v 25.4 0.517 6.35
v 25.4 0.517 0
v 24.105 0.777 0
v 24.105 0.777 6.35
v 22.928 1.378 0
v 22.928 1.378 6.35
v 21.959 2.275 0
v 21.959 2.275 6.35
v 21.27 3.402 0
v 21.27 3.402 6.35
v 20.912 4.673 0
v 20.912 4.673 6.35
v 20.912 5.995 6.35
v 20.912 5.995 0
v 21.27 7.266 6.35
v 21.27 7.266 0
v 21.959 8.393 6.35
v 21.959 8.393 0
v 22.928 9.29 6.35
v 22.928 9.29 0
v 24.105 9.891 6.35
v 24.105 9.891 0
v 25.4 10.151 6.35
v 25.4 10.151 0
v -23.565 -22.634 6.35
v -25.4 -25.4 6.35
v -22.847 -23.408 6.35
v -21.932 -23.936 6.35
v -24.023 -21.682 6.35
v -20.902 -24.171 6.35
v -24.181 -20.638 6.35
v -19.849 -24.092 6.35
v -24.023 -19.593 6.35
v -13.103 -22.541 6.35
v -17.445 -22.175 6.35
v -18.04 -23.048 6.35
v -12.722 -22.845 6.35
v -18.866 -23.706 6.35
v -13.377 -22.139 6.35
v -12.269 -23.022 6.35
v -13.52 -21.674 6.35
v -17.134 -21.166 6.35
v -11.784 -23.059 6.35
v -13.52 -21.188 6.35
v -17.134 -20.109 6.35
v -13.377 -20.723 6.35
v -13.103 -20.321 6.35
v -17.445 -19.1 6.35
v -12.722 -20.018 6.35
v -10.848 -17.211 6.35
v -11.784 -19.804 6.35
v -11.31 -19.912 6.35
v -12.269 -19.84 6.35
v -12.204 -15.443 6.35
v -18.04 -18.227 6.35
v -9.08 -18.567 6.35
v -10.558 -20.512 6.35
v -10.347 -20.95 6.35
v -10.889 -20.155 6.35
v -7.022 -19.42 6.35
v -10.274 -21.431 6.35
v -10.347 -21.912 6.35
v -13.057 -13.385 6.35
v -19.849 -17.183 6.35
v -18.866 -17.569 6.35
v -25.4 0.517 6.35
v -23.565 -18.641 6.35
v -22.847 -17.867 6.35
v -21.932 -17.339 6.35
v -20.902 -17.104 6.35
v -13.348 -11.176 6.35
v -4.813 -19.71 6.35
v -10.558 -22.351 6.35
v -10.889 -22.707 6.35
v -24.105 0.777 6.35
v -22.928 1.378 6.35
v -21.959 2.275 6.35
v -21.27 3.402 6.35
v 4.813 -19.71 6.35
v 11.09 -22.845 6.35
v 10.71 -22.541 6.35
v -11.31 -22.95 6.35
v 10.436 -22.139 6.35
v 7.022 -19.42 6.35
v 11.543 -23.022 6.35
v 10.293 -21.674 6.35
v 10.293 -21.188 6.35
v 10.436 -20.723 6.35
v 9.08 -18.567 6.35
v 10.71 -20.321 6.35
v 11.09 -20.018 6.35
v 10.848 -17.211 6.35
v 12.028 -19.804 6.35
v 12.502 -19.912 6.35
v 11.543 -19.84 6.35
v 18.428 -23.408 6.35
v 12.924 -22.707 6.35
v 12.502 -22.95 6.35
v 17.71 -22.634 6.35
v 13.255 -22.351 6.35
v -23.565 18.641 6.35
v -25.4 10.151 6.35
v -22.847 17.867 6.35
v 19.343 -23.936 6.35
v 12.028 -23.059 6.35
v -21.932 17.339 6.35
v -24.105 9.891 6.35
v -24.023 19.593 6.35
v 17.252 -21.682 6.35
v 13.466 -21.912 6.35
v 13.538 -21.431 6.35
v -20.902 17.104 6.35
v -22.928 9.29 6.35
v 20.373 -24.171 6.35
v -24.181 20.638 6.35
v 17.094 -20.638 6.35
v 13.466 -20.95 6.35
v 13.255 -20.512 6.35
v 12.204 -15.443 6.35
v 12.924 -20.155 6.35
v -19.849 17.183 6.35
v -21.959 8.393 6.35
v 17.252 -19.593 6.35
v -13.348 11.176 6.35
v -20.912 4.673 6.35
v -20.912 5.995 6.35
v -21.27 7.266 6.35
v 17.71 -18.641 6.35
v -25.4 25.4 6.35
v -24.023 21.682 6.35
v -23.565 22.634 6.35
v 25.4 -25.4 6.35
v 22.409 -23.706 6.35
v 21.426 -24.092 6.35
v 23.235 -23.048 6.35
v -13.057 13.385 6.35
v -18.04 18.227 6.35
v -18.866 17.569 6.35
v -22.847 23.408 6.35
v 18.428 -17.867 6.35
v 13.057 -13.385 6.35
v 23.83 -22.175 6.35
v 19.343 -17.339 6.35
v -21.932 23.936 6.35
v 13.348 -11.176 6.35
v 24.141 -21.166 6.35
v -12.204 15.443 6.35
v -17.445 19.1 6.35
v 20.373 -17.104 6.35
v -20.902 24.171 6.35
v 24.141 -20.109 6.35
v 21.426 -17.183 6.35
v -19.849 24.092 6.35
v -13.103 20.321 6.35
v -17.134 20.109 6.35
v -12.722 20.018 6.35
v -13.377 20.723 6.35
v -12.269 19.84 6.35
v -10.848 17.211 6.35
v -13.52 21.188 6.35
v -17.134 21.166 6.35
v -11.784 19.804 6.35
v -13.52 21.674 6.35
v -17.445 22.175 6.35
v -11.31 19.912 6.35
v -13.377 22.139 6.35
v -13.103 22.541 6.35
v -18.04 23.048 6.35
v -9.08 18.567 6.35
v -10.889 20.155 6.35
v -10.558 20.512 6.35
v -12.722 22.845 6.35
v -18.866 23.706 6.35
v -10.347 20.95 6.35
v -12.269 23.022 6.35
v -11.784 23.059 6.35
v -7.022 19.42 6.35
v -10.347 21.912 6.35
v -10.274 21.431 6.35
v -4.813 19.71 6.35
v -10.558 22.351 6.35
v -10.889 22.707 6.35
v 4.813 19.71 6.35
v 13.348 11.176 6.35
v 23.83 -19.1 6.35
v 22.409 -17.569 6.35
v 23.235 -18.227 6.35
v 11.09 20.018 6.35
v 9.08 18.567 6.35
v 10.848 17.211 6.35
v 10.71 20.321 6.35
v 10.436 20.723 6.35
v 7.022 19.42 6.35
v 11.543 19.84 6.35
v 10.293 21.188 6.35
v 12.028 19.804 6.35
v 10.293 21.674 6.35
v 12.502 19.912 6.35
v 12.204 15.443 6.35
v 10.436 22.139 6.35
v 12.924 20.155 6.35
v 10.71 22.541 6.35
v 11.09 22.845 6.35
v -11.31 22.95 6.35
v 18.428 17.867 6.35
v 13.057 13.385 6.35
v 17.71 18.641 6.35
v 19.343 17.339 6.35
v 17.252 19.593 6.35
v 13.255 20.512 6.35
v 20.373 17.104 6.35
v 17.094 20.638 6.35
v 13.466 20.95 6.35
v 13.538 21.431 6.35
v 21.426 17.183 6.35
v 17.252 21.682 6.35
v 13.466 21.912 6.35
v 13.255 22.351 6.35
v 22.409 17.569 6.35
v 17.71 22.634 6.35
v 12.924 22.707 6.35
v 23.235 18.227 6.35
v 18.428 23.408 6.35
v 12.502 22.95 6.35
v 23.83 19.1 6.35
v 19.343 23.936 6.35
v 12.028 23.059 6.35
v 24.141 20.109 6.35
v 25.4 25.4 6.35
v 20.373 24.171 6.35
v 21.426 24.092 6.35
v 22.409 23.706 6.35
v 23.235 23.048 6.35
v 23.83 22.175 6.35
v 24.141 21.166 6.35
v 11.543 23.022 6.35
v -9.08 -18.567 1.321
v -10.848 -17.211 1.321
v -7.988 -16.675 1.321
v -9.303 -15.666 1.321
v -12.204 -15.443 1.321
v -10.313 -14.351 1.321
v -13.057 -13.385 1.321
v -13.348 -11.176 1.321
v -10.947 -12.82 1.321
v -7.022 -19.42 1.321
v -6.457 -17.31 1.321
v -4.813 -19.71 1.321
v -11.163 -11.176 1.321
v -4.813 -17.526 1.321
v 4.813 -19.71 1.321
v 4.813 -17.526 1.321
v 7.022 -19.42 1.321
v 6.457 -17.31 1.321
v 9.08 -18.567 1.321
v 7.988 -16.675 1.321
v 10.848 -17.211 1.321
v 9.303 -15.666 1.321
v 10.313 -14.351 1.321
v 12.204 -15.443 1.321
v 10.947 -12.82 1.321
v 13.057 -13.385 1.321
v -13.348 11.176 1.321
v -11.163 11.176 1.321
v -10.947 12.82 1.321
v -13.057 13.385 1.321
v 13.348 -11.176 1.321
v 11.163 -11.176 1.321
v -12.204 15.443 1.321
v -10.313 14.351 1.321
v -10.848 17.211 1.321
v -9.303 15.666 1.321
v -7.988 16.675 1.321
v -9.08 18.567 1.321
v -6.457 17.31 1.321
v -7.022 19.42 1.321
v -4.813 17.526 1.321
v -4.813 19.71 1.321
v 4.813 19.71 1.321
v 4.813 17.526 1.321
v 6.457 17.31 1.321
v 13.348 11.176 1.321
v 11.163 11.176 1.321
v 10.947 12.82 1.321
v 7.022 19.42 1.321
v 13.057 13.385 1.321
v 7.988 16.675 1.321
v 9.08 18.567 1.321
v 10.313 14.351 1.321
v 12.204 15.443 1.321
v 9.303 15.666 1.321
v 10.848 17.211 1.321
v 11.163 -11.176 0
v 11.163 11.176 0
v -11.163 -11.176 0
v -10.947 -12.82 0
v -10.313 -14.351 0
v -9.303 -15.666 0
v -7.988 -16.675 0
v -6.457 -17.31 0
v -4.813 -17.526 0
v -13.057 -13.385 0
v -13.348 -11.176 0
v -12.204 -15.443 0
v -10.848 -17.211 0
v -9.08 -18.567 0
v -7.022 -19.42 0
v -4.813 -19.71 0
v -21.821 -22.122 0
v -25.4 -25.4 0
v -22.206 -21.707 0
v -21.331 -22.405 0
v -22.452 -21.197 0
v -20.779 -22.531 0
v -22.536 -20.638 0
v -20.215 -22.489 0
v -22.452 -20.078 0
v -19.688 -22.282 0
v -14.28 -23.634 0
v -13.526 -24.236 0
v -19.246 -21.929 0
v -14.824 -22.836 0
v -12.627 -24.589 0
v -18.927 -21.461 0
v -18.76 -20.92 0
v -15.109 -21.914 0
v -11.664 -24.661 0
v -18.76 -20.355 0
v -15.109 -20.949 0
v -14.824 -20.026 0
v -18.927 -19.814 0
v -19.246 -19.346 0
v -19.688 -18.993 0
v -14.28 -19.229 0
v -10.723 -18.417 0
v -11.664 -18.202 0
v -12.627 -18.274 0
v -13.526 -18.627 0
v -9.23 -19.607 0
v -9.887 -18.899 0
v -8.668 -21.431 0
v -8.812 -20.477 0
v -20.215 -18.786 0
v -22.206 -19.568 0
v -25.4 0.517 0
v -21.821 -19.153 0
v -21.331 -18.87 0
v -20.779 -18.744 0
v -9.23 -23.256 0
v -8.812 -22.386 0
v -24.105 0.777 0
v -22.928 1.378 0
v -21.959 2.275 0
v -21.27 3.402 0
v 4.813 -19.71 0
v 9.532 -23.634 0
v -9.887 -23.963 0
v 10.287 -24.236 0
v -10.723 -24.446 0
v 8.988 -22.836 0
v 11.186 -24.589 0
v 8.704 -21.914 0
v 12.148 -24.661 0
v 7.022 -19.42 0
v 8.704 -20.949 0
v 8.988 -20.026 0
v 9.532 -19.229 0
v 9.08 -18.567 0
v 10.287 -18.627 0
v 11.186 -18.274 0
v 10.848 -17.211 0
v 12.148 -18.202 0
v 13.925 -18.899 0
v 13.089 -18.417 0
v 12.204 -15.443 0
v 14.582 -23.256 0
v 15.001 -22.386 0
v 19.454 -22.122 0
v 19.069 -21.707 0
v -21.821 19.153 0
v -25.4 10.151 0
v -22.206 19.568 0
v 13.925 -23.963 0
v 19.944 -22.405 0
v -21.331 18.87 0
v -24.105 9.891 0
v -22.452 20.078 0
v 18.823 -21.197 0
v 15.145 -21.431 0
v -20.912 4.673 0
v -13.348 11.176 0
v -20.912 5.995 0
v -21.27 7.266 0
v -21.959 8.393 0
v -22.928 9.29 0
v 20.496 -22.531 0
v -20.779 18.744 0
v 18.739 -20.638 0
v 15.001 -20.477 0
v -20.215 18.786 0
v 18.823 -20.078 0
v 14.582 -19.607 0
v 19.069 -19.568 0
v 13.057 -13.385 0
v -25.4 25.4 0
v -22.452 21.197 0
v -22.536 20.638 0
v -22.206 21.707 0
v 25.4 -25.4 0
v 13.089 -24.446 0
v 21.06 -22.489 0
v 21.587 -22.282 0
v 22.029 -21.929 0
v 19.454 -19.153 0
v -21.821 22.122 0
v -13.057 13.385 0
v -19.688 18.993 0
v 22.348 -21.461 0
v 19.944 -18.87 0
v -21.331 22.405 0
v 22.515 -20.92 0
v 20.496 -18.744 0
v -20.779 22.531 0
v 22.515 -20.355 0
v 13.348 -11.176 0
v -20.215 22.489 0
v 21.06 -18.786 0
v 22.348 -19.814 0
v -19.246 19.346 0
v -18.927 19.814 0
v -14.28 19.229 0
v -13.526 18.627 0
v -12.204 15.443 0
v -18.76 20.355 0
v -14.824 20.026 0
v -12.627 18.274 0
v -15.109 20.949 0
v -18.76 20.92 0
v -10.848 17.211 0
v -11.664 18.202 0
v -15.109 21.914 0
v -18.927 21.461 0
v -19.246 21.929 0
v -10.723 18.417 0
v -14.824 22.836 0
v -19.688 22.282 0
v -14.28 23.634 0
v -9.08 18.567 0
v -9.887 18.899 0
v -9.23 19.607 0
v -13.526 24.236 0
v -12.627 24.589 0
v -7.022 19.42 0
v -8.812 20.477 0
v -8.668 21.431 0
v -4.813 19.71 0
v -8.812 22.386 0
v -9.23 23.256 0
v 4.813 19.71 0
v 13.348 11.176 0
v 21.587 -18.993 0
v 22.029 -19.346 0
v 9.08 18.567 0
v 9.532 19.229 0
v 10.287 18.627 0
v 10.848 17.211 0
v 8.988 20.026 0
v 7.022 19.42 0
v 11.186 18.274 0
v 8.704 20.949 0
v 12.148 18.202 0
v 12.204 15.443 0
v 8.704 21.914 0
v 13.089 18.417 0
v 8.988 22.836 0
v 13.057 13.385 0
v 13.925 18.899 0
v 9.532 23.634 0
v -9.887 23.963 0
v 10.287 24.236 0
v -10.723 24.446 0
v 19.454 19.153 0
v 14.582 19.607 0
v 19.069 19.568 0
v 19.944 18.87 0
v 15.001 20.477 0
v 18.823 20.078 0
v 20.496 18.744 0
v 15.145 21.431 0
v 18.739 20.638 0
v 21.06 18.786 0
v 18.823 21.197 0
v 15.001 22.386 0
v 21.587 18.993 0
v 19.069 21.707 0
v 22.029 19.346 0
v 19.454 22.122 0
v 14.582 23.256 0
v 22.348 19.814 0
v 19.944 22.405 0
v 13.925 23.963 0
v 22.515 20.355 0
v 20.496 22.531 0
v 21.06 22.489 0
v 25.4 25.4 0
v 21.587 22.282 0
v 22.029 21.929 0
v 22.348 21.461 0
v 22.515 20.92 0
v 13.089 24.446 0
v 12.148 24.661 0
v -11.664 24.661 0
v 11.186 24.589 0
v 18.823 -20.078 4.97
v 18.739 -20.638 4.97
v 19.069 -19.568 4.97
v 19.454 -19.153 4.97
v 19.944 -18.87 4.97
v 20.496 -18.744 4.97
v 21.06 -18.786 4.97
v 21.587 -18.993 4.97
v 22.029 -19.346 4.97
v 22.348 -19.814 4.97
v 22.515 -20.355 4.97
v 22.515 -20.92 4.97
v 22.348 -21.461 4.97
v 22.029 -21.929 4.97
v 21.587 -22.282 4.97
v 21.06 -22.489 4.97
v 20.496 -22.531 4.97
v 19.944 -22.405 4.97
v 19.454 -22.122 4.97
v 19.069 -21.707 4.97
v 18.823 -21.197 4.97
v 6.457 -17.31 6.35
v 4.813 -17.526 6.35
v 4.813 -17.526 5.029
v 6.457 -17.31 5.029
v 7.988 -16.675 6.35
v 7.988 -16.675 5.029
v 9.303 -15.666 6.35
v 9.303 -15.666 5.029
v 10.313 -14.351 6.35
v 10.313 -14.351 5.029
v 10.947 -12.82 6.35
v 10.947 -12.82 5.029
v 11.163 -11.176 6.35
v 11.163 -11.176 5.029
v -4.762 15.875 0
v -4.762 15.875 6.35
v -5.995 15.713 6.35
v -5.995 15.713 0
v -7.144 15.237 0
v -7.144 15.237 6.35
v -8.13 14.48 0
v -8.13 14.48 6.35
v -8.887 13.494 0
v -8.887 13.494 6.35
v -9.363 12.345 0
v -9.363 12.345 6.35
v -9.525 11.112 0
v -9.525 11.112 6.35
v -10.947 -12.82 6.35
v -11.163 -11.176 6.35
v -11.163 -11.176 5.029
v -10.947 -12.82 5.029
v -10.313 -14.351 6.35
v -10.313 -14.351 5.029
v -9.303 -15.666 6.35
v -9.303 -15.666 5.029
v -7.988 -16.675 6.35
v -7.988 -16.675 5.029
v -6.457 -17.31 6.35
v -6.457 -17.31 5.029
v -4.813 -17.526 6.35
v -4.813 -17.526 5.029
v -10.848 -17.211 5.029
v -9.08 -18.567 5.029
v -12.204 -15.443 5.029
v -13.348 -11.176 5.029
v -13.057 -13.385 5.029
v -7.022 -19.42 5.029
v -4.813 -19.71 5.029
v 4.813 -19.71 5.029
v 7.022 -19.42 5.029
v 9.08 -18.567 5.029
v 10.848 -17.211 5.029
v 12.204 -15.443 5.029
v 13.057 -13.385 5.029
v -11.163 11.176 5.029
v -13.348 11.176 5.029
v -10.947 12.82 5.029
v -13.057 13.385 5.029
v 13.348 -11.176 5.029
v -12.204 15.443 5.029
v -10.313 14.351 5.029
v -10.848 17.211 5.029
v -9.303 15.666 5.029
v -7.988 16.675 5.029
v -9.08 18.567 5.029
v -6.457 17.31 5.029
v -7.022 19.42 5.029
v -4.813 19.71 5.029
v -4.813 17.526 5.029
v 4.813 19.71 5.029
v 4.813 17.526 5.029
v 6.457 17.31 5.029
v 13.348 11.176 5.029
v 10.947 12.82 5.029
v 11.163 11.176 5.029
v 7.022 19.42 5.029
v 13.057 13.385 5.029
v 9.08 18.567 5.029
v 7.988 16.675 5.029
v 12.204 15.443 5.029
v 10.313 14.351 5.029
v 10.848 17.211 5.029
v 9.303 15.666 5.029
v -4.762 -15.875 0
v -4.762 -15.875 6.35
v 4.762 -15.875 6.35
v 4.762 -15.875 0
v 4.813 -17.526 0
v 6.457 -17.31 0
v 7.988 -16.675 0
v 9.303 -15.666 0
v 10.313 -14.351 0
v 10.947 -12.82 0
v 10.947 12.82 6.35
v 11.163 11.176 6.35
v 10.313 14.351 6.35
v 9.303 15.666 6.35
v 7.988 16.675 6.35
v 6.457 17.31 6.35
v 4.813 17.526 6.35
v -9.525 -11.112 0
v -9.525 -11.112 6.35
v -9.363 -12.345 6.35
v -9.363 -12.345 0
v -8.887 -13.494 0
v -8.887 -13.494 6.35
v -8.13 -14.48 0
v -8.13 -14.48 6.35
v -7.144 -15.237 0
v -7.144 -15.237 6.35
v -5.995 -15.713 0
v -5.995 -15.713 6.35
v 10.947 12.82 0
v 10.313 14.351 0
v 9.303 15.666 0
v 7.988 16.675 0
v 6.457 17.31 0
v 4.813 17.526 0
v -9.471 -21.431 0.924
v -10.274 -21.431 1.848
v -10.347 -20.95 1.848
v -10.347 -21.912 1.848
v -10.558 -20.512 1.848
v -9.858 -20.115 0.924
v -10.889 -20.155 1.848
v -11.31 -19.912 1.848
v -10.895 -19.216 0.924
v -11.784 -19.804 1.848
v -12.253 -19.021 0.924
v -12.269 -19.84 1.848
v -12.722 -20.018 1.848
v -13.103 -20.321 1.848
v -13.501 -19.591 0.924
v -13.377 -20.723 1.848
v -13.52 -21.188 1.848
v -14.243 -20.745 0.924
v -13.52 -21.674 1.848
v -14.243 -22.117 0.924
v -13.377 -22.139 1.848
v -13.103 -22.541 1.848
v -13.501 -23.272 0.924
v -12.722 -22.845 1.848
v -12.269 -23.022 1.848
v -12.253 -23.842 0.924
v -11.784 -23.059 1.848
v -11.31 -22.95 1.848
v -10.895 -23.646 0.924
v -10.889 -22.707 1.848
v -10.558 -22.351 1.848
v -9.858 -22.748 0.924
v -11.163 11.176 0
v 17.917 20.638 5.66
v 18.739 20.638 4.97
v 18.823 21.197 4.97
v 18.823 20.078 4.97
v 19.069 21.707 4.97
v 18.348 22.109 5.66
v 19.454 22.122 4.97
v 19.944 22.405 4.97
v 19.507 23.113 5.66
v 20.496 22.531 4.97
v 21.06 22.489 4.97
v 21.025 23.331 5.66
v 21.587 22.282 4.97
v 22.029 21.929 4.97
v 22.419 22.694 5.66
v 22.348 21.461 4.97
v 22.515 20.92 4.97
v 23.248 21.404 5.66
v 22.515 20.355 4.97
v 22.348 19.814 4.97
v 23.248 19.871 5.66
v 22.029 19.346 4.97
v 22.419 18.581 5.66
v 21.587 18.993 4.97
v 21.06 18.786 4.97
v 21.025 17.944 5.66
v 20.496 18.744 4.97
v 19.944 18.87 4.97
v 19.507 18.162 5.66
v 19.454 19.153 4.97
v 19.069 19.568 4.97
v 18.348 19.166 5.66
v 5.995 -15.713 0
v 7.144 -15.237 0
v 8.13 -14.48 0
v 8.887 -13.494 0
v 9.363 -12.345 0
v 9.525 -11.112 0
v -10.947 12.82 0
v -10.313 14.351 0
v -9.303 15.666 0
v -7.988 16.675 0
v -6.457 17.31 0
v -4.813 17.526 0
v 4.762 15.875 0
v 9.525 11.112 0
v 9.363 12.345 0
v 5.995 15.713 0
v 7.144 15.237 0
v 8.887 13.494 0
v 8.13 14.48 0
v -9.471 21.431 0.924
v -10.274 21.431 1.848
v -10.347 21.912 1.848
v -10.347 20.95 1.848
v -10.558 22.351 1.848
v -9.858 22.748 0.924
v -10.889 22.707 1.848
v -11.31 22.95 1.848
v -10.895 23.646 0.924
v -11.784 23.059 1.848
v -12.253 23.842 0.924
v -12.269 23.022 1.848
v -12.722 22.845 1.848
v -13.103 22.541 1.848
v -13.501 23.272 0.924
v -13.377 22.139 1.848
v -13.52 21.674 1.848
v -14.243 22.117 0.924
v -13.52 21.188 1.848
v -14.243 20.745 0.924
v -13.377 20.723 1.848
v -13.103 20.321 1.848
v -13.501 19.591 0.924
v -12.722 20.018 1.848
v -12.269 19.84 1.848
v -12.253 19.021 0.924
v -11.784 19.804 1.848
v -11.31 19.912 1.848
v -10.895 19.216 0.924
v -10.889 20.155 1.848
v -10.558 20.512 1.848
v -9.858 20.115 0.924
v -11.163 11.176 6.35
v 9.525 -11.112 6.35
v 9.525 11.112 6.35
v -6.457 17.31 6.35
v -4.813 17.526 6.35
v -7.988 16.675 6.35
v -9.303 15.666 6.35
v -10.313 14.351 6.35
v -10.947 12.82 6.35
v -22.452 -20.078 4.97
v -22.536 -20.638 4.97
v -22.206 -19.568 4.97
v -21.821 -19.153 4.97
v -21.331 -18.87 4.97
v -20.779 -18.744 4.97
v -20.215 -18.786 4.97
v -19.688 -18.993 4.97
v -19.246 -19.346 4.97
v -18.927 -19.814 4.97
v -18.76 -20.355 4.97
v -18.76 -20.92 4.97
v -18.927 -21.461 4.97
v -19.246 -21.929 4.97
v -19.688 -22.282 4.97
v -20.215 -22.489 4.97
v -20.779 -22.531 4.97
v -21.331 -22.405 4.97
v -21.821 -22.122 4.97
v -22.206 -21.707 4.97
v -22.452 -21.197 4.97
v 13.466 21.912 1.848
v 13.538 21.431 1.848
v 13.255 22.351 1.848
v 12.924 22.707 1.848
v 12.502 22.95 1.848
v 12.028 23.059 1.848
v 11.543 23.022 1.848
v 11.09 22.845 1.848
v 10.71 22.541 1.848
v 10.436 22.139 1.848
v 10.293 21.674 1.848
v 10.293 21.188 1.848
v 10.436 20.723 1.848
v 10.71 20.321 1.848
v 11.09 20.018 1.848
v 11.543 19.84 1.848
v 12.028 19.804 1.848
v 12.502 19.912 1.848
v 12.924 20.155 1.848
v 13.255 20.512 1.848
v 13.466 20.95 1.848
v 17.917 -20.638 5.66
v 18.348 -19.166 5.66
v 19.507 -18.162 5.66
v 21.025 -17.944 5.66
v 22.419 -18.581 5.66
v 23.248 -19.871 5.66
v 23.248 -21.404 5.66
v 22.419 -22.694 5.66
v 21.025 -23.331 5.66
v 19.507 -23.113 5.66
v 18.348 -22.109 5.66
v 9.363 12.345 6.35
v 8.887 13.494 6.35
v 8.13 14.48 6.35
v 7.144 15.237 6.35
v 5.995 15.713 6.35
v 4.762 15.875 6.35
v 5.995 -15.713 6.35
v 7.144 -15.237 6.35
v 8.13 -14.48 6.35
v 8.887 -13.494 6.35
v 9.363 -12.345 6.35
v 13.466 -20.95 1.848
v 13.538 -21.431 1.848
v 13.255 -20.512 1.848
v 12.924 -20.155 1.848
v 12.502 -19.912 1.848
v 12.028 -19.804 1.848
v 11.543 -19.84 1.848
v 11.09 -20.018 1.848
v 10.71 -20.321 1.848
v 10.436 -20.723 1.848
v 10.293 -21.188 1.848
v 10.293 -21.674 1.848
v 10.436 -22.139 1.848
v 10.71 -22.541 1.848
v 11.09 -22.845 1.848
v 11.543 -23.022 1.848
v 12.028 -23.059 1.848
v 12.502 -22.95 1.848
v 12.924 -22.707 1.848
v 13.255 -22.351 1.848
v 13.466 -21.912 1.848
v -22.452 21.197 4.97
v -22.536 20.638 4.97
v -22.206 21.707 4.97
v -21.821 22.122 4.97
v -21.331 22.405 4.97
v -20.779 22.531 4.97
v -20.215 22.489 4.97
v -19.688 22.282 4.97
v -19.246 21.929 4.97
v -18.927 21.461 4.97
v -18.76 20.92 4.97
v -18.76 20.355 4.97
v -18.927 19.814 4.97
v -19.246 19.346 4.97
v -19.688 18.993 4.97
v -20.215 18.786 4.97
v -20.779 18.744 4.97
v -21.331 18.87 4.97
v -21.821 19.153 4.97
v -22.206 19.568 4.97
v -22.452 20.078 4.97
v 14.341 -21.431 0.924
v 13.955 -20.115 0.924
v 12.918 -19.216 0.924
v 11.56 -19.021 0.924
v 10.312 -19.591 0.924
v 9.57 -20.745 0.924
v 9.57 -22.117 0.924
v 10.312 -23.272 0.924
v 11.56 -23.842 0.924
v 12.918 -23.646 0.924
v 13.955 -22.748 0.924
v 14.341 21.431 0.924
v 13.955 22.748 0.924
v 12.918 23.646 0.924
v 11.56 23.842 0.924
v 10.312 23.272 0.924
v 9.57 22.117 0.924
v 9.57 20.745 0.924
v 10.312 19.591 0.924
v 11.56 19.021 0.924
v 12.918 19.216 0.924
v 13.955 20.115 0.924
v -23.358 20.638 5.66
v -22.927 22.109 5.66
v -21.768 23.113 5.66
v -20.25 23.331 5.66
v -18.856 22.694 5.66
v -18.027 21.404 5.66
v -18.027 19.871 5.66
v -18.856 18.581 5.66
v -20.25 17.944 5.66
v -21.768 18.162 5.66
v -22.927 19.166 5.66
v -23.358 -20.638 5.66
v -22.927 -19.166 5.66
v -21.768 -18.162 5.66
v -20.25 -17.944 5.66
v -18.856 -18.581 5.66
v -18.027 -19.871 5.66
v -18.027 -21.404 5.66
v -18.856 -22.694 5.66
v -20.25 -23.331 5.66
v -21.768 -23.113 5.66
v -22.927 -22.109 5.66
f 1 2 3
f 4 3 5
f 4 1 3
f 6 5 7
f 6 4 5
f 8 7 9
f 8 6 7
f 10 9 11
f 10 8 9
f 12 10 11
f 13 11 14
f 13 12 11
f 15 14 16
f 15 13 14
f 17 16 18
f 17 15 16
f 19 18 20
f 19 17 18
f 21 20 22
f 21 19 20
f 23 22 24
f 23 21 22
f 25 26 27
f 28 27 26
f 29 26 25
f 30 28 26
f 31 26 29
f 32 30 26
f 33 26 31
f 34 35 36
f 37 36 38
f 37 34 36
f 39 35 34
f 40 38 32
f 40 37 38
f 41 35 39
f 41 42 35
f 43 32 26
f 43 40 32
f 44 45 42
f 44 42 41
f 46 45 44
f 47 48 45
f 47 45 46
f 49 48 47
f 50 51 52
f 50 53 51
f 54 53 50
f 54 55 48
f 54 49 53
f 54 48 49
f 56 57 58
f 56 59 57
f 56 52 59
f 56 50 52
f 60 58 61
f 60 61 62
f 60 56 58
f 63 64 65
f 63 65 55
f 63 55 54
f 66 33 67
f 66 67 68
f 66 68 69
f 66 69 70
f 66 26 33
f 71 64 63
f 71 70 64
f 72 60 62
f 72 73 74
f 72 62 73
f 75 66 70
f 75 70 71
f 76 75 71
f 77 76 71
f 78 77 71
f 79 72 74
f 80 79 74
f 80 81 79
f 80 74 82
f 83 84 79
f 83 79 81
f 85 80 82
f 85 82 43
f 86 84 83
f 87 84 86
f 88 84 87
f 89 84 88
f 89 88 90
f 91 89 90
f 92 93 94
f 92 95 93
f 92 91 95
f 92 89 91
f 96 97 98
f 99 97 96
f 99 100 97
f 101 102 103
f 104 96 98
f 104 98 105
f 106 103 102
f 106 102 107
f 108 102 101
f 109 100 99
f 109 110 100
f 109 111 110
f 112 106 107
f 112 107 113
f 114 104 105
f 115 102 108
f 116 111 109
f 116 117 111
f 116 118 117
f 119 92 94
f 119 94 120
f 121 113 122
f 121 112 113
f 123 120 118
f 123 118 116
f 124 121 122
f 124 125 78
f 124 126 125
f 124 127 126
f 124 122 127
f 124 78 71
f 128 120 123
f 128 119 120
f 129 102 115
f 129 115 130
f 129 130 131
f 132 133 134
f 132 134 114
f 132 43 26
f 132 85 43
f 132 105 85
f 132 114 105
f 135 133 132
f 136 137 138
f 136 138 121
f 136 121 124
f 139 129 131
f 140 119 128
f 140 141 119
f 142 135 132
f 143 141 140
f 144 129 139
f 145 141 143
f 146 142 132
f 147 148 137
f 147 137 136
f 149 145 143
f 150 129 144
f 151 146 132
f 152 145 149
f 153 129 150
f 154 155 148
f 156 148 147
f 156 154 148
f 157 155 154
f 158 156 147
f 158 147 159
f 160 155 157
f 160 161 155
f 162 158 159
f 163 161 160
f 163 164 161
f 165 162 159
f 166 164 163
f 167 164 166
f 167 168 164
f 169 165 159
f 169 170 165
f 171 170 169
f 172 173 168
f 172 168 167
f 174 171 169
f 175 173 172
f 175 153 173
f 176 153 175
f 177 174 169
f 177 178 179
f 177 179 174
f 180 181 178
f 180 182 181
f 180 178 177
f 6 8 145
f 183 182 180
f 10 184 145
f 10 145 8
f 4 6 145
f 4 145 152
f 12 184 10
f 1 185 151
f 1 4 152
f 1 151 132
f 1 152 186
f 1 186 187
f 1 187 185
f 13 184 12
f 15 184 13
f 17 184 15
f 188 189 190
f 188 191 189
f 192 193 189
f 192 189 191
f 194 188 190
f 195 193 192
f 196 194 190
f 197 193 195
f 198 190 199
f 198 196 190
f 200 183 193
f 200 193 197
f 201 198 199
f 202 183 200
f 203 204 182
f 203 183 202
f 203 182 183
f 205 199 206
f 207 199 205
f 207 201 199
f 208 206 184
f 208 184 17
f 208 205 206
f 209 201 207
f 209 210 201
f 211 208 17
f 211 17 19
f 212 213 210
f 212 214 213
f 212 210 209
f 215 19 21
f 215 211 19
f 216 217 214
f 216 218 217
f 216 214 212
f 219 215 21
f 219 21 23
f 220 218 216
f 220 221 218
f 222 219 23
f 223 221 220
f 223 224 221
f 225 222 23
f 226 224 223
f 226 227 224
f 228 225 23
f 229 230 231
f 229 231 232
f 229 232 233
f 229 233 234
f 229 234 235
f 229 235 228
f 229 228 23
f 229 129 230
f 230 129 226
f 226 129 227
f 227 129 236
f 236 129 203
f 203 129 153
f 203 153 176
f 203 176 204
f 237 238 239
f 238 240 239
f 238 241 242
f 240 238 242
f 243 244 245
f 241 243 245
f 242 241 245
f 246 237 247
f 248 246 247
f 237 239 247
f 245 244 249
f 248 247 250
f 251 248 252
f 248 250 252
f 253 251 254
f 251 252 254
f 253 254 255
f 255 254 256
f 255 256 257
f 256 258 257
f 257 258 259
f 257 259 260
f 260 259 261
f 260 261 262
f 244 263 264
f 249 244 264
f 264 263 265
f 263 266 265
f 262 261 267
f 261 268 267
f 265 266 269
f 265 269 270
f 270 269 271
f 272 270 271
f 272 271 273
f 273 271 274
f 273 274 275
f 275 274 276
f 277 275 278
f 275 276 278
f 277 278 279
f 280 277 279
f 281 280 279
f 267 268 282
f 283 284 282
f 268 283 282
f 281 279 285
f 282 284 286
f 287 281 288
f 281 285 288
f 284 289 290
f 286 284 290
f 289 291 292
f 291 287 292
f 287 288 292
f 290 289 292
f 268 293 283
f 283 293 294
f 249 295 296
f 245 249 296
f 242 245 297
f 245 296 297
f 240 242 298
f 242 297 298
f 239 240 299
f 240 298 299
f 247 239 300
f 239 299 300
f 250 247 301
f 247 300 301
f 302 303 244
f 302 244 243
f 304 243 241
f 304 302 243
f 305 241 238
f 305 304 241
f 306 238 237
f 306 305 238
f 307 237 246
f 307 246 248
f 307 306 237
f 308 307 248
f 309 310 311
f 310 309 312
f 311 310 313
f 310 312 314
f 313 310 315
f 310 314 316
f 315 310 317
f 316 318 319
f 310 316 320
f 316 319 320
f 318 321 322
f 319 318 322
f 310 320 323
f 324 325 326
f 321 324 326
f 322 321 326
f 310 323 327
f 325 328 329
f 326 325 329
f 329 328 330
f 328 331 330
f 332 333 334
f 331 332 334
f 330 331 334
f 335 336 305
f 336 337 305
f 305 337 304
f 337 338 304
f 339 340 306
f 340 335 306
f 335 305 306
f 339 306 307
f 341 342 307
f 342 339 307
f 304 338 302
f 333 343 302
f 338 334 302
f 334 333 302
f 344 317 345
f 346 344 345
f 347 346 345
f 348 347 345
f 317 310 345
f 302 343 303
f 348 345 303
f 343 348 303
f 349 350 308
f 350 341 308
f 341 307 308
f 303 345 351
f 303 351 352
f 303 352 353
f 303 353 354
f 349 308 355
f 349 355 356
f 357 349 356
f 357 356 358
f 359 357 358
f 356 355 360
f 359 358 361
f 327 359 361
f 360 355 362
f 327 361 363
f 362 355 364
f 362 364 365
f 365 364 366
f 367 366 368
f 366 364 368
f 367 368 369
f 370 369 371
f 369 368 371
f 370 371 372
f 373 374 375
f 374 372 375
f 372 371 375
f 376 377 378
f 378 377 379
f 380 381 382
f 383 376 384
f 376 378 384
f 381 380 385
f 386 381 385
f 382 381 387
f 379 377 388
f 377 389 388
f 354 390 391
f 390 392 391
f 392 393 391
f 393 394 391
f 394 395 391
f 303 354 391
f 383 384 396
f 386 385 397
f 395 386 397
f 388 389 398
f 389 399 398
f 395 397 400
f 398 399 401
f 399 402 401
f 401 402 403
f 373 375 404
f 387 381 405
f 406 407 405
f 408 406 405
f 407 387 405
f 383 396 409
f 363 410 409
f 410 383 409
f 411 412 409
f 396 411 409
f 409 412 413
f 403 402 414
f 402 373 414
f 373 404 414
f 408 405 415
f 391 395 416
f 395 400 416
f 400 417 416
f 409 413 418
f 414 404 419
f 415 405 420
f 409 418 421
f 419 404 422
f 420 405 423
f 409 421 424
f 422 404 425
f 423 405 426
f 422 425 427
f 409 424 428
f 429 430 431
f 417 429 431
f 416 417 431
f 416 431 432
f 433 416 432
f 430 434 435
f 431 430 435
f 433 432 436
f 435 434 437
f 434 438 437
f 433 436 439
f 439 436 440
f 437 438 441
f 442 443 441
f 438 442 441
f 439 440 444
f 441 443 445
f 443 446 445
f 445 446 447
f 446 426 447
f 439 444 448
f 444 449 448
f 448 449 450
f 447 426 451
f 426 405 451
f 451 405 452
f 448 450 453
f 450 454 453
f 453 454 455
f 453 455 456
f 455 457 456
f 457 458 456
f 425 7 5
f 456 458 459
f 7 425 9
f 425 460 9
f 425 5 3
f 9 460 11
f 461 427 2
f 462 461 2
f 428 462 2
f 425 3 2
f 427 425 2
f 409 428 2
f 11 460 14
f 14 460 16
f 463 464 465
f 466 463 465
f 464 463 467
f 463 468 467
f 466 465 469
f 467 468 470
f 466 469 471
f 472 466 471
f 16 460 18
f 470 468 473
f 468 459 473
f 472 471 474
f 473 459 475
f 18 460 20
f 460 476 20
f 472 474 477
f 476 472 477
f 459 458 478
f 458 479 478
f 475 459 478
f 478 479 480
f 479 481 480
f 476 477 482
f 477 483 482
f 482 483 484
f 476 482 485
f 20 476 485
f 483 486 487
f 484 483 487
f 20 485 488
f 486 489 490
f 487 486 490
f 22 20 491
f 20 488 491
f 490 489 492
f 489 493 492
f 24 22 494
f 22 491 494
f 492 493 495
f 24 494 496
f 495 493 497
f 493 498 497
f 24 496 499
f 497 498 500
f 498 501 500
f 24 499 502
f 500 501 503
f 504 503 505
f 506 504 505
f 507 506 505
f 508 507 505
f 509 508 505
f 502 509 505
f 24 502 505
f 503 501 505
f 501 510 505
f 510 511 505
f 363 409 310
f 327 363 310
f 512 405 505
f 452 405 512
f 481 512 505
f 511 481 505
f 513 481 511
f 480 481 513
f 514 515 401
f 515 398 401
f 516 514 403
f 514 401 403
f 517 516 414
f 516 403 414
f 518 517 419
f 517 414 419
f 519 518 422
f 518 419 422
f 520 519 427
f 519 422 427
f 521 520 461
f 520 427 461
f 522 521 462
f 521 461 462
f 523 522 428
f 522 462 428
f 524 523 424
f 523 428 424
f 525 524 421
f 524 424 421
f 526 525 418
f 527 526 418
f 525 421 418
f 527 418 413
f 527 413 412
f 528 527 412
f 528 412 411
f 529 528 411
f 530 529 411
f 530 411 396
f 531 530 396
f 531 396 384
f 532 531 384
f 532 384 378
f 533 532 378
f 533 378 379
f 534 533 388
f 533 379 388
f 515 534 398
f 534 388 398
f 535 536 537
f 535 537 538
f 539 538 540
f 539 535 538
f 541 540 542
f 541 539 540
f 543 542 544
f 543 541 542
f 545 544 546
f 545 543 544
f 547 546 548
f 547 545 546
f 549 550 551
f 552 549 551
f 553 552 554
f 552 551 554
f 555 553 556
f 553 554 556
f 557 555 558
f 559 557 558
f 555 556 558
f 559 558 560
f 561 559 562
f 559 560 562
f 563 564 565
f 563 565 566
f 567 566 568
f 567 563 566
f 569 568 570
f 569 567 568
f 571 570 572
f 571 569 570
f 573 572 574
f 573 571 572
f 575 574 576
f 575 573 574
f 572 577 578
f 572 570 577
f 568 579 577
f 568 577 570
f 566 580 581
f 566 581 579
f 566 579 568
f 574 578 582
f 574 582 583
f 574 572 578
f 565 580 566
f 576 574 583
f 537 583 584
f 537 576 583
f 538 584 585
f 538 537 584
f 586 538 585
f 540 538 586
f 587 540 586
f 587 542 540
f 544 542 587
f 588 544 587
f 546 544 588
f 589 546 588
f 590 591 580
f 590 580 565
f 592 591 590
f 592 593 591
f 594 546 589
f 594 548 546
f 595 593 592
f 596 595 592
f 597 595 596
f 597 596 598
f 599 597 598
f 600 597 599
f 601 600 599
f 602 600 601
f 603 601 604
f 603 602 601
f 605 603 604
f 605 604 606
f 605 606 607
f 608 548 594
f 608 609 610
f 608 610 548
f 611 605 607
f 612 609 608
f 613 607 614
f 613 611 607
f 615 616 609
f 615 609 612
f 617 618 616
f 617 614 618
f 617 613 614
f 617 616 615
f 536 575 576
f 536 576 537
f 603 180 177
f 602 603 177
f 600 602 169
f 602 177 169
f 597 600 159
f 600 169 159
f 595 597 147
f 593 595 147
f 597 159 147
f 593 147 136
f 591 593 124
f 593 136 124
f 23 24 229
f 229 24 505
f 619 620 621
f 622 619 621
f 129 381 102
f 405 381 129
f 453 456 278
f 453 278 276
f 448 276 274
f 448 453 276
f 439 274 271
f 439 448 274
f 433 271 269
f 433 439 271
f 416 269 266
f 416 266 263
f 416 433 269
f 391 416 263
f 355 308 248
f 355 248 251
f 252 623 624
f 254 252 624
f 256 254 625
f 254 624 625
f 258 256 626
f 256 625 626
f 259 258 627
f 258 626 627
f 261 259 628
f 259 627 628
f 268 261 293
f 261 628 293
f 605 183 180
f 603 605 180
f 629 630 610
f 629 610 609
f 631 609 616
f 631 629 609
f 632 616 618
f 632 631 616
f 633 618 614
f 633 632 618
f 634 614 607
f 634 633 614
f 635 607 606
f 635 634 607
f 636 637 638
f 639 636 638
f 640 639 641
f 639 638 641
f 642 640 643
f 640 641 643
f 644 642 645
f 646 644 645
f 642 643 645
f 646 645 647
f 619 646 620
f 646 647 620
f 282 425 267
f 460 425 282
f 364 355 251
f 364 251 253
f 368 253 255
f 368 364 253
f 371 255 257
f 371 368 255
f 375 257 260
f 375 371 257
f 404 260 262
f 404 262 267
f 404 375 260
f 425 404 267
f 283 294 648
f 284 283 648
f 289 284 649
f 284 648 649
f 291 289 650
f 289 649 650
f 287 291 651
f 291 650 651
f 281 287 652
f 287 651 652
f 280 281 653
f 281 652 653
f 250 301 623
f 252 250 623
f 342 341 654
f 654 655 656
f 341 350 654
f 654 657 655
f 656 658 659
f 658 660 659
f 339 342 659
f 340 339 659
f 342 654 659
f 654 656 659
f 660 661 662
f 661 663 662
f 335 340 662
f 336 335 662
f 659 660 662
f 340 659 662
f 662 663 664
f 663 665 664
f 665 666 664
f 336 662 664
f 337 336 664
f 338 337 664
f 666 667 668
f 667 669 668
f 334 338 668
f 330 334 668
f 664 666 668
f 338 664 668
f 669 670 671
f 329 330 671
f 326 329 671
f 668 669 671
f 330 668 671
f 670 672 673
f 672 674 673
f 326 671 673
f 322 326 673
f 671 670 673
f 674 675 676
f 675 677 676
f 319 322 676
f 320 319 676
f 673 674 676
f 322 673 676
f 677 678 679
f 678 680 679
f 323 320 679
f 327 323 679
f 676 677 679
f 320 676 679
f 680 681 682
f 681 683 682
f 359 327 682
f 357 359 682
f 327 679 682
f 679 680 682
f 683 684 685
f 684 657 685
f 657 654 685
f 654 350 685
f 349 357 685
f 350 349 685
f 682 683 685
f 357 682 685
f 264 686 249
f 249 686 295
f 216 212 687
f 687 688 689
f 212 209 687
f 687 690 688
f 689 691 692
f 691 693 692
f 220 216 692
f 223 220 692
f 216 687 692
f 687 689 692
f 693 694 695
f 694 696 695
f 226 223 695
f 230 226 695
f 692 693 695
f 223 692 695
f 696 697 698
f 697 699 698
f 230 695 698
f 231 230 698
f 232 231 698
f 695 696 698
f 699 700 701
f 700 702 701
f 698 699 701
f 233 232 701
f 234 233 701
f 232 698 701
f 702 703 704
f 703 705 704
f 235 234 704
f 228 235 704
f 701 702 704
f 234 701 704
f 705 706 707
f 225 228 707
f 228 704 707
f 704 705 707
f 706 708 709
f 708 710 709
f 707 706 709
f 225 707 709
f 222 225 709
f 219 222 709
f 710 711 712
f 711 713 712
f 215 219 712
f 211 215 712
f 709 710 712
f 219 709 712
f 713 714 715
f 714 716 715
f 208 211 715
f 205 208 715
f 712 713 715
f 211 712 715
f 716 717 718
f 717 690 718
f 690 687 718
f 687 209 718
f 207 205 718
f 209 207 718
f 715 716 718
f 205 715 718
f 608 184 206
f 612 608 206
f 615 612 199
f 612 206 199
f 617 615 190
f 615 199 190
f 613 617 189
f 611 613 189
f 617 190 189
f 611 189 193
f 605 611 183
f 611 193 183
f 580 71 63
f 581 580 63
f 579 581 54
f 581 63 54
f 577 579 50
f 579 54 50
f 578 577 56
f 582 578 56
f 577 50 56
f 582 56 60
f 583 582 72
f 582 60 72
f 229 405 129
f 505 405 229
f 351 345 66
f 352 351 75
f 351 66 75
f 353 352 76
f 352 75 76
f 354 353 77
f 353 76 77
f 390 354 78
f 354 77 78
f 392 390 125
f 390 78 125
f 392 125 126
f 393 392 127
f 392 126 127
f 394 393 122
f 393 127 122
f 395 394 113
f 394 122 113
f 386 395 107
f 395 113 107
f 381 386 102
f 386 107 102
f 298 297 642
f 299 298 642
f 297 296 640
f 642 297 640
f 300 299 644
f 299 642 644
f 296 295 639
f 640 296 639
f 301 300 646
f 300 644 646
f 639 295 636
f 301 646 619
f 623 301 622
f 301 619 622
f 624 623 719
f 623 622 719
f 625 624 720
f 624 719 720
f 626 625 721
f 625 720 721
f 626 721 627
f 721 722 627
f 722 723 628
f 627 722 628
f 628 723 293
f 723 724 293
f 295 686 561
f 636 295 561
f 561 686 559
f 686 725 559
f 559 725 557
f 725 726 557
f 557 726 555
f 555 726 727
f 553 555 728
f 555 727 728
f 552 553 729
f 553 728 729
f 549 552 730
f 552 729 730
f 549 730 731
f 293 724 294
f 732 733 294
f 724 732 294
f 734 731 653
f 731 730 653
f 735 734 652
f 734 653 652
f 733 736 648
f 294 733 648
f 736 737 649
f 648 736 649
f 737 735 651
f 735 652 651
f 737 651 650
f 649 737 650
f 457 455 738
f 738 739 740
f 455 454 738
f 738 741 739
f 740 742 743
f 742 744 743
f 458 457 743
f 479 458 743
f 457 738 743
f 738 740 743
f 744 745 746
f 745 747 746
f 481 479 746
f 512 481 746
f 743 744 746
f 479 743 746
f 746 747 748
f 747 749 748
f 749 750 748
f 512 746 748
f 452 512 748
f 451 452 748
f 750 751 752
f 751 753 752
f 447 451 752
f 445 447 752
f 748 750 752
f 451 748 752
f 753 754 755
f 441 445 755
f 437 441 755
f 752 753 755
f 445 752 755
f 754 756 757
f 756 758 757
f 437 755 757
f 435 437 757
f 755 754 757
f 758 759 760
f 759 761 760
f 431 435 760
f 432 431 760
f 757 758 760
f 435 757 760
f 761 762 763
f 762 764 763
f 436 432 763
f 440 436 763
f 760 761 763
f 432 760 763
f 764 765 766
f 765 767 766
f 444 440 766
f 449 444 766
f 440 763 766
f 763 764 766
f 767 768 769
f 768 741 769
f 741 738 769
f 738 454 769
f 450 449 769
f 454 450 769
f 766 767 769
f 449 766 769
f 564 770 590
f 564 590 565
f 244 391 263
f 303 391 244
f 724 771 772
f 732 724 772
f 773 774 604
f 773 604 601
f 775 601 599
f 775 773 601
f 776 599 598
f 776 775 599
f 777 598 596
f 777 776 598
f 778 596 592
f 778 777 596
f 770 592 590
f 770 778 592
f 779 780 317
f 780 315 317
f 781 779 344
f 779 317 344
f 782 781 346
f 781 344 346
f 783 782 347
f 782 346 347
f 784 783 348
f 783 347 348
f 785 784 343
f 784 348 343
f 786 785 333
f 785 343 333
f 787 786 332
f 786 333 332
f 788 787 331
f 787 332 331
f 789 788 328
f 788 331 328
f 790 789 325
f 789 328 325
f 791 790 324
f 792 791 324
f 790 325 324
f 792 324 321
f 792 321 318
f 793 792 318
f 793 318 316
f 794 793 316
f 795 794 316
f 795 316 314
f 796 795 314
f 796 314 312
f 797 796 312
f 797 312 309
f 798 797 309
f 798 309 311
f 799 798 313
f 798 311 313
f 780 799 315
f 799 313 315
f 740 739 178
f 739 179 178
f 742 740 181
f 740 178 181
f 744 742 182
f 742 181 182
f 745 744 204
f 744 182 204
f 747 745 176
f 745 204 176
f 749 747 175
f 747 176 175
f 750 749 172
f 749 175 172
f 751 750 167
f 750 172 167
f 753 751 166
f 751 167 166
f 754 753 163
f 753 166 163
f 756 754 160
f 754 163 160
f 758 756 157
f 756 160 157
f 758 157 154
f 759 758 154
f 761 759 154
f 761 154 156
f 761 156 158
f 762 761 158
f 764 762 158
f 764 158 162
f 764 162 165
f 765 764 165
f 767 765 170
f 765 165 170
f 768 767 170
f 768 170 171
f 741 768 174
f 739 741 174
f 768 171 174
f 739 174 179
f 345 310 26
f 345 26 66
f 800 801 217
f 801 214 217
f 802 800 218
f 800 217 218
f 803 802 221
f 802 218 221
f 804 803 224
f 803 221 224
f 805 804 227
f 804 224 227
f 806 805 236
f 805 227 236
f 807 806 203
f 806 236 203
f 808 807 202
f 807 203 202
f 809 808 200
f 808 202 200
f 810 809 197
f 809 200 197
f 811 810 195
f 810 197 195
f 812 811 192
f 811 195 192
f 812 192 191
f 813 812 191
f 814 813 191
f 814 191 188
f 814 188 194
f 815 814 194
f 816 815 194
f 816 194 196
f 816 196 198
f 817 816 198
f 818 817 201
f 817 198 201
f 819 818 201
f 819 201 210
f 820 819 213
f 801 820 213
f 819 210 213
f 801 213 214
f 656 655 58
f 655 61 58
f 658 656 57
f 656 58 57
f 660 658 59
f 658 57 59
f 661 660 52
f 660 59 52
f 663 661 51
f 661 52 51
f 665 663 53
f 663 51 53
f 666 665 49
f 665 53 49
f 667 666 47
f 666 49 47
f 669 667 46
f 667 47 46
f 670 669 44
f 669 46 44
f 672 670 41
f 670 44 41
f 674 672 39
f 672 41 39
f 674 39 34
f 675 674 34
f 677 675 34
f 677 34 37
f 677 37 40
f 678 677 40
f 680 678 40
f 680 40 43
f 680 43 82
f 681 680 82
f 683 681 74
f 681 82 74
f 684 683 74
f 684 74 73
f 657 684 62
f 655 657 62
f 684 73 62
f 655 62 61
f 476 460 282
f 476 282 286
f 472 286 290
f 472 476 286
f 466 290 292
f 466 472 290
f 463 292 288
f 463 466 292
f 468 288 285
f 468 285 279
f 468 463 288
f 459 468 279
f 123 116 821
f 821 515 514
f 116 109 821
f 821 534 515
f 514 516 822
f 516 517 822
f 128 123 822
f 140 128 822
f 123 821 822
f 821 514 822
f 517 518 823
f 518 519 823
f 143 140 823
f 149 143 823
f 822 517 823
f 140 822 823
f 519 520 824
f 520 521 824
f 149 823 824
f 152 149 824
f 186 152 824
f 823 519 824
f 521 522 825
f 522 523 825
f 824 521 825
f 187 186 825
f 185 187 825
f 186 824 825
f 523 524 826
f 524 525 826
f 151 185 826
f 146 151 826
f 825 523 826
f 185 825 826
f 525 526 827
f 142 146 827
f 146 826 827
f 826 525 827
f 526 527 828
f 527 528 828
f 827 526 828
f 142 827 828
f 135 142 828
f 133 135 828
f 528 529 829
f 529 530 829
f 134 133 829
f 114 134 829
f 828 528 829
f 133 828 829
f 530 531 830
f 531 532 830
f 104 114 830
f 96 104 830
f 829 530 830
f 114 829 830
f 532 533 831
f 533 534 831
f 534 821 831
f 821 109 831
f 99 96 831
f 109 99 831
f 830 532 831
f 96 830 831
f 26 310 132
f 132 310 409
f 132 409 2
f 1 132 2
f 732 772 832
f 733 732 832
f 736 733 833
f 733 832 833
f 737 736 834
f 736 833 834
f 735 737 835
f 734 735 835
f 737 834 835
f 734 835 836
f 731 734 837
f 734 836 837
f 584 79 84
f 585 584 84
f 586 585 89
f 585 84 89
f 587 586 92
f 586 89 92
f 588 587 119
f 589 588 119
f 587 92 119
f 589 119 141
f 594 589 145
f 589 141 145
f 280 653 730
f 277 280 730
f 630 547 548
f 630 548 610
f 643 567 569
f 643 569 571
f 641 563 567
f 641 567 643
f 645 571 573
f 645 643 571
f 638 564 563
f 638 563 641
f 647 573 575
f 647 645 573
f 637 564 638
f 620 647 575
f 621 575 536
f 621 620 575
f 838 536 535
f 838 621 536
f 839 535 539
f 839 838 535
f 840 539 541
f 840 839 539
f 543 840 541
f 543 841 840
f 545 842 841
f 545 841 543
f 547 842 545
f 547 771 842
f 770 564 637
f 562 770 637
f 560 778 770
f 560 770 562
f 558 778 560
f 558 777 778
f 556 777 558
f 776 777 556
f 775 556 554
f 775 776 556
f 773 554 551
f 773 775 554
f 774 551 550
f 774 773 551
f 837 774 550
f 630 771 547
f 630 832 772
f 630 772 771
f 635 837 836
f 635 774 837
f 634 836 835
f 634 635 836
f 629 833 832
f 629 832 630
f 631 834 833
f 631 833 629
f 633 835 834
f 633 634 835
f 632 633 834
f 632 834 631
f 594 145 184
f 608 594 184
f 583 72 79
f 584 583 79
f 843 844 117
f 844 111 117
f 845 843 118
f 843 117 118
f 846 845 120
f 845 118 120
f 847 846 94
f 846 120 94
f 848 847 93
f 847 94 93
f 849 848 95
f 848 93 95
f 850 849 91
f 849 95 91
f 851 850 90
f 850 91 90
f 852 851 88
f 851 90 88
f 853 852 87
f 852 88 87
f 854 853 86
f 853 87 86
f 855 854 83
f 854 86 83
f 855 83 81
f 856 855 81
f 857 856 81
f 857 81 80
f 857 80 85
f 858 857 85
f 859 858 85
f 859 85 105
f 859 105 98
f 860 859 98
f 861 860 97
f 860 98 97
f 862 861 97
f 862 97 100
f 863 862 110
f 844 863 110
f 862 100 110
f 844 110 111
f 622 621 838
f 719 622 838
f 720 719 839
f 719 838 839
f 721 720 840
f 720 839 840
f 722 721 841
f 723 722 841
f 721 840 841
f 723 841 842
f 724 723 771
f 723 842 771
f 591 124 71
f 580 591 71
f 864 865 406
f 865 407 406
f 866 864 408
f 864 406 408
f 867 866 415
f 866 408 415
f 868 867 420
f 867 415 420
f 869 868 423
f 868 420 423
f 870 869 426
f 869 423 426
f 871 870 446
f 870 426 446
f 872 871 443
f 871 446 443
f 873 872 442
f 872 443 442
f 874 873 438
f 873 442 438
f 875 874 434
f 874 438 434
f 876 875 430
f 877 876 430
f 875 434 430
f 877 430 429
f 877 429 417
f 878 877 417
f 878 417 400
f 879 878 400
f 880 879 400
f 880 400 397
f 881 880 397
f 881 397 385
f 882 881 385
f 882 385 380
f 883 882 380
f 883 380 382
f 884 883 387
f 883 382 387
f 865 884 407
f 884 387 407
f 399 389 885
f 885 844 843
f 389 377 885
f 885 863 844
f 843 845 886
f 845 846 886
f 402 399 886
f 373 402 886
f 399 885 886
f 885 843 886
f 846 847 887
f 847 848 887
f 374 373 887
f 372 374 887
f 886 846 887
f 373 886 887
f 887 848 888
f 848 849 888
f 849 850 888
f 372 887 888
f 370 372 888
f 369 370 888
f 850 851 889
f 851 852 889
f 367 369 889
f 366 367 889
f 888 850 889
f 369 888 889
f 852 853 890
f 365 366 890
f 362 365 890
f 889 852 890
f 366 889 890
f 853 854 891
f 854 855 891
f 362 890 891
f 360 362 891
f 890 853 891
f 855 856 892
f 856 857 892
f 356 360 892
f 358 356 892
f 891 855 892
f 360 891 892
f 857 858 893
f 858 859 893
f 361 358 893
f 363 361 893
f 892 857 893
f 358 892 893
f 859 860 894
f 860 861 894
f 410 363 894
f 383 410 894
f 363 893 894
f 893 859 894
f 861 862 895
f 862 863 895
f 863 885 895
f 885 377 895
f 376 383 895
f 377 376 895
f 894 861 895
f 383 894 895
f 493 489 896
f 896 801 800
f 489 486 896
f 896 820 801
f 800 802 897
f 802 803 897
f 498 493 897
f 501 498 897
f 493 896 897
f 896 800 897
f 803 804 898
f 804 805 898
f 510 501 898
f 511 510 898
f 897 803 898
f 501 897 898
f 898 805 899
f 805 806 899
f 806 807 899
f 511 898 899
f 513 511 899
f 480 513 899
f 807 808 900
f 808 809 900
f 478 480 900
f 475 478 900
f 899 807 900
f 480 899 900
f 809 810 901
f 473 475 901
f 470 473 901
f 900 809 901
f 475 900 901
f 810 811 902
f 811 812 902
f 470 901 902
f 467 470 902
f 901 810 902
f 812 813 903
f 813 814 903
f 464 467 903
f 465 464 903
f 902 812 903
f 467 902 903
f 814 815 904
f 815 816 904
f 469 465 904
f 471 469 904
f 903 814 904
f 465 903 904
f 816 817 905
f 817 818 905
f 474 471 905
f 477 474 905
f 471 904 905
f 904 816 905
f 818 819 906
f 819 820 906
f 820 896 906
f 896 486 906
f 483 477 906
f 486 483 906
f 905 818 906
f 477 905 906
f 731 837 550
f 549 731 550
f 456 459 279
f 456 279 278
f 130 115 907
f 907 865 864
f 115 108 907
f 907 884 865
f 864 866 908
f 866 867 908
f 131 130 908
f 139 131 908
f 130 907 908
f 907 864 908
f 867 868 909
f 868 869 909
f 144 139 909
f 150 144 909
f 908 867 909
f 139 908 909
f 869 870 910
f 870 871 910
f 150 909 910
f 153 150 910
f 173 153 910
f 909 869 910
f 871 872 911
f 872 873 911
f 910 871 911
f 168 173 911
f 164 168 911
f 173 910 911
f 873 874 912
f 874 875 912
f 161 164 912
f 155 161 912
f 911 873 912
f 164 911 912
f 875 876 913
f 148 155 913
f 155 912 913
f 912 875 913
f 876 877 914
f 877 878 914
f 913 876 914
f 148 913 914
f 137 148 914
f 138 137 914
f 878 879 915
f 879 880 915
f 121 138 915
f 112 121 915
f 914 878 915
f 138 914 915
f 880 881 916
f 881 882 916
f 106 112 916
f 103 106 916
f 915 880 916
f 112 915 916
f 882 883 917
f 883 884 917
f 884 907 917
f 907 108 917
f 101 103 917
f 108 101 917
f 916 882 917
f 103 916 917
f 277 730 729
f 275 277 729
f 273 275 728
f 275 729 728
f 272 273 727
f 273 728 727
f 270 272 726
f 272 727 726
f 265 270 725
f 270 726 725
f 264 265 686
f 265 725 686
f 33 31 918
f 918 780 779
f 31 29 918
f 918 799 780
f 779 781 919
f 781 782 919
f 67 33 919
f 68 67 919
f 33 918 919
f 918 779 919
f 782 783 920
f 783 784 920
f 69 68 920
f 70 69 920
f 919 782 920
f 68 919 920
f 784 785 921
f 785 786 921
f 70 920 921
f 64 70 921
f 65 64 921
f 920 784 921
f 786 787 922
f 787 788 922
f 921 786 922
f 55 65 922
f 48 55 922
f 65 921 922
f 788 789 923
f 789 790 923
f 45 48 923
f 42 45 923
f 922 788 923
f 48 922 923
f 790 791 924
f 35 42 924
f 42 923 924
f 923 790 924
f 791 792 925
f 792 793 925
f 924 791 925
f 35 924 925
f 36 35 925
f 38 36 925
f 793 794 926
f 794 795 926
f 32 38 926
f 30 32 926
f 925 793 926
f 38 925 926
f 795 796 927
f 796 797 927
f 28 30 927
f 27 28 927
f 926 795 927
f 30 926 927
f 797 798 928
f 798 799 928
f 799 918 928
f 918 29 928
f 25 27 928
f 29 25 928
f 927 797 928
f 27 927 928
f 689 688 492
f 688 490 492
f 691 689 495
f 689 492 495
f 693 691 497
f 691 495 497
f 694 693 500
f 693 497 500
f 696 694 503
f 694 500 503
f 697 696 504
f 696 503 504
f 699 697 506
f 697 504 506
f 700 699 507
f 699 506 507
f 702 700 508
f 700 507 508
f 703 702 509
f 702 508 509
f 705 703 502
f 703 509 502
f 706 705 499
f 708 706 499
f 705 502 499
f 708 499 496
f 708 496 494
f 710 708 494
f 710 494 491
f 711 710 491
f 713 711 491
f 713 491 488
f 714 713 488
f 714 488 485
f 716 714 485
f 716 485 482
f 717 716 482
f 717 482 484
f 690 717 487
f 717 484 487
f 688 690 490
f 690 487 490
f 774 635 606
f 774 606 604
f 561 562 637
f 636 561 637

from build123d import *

# Parameters (mm, degrees)
SKETCH1_W                                         = 50.8
SKETCH1_H                                         = 50.8
BOSS_EXTRUDE1_DEPTH                               = 6.35
CUT_EXTRUDE1_DEPTH                                = 7.35
CUT_EXTRUDE2_DASH_027_DEPTH                       = 1.3208
CSK_FOR_6_FLAT_HEAD_MACHINE_SCREW_100_D           = 3.7973
CSK_FOR_6_FLAT_HEAD_MACHINE_SCREW_100_CSINK_D     = 7.0866
CSK_FOR_6_FLAT_HEAD_MACHINE_SCREW_100_CSINK_ANGLE = 100
CSK_FOR_4_FLAT_HEAD_MACHINE_SCREW_100_D           = 3.2639
CSK_FOR_4_FLAT_HEAD_MACHINE_SCREW_100_CSINK_D     = 6.477
CSK_FOR_4_FLAT_HEAD_MACHINE_SCREW_100_CSINK_ANGLE = 82
SKETCH8_R                                         = 4.826
CUT_EXTRUDE2_DEPTH                                = 7.35


with BuildPart() as part:
    # Sketch1 → Boss-Extrude1 (new body)
    with BuildSketch(Plane.XY):
        Rectangle(SKETCH1_W, SKETCH1_H)
    extrude(amount=BOSS_EXTRUDE1_DEPTH)

    # Sketch2 → Cut-Extrude1 (cut, through all)
    with BuildSketch(Plane.XY.offset(6.35)):
        with BuildLine():
            Line((-4.7625, -15.875), (4.7625, -15.875))
            ThreePointArc((4.7625, -15.875), (8.130096045, -14.480096045), (9.525, -11.1125))
            Line((9.525, -11.1125), (9.525, 11.1125))
            ThreePointArc((9.525, 11.1125), (8.130096045, 14.480096045), (4.7625, 15.875))
            Line((4.7625, 15.875), (-4.7625, 15.875))
            ThreePointArc((-4.7625, 15.875), (-8.130096045, 14.480096045), (-9.525, 11.1125))
            Line((-9.525, 11.1125), (-9.525, -11.1125))
            ThreePointArc((-9.525, -11.1125), (-8.130096045, -14.480096045), (-4.7625, -15.875))
        make_face()
    extrude(amount=-CUT_EXTRUDE1_DEPTH, mode=Mode.SUBTRACT)

    # Sketch3 → Cut-Extrude2 - dash 027 (cut)
    with BuildSketch(Plane.XY.offset(6.35)):
        with BuildLine():
            Line((13.3477, -11.176), (13.3477, 11.176))
            ThreePointArc((13.3477, 11.176), (10.848032113, 17.210732113), (4.8133, 19.7104))
            Line((4.8133, 19.7104), (-4.8133, 19.7104))
            ThreePointArc((-4.8133, 19.7104), (-10.848032113, 17.210732113), (-13.3477, 11.176))
            Line((-13.3477, 11.176), (-13.3477, -11.176))
            ThreePointArc((-13.3477, -11.176), (-10.848032113, -17.210732113), (-4.8133, -19.7104))
            Line((-4.8133, -19.7104), (4.8133, -19.7104))
            ThreePointArc((4.8133, -19.7104), (10.848032113, -17.210732113), (13.3477, -11.176))
        make_face()
        with BuildLine():
            Line((-4.8133, -17.526), (4.8133, -17.526))
            ThreePointArc((4.8133, -17.526), (9.303428061, -15.666128061), (11.1633, -11.176))
            Line((11.1633, -11.176), (11.1633, 11.176))
            ThreePointArc((11.1633, 11.176), (9.303428061, 15.666128061), (4.8133, 17.526))
            Line((4.8133, 17.526), (-4.8133, 17.526))
            ThreePointArc((-4.8133, 17.526), (-9.303428061, 15.666128061), (-11.1633, 11.176))
            Line((-11.1633, 11.176), (-11.1633, -11.176))
            ThreePointArc((-11.1633, -11.176), (-9.303428061, -15.666128061), (-4.8133, -17.526))
        make_face(mode=Mode.SUBTRACT)
    cut_extrude2_dash_027 = extrude(amount=-CUT_EXTRUDE2_DASH_027_DEPTH, mode=Mode.SUBTRACT)

    # CSK for #6 Flat Head Machine Screw (100)1 (through all)
    with Locations(Plane.XY.offset(6.35)):
        with Locations((-20.6375, 20.6375), (20.6375, 20.6375), (20.6375, -20.6375), (-20.6375, -20.6375)):
            CounterSinkHole(CSK_FOR_6_FLAT_HEAD_MACHINE_SCREW_100_D / 2, CSK_FOR_6_FLAT_HEAD_MACHINE_SCREW_100_CSINK_D / 2, counter_sink_angle=CSK_FOR_6_FLAT_HEAD_MACHINE_SCREW_100_CSINK_ANGLE)

    # CSK for #4 Flat Head Machine Screw (100)1 (through all)
    with Locations(Plane(origin=(0, 0, 0), x_dir=(-1, 0, 0), z_dir=(0, 0, -1))):
        with Locations((-11.90625, 21.43125), (11.90625, 21.43125), (-11.90625, -21.43125), (11.90625, -21.43125)):
            CounterSinkHole(CSK_FOR_4_FLAT_HEAD_MACHINE_SCREW_100_D / 2, CSK_FOR_4_FLAT_HEAD_MACHINE_SCREW_100_CSINK_D / 2, counter_sink_angle=CSK_FOR_4_FLAT_HEAD_MACHINE_SCREW_100_CSINK_ANGLE)

    # Mirror1: Cut-Extrude2 - dash 027 across plane
    add(cut_extrude2_dash_027.mirror(Plane(origin=(0, 0, 3.175), x_dir=(1, 0, 0), z_dir=(0, 0, -1))), mode=Mode.SUBTRACT)

    # Sketch8 → Cut-Extrude2 (cut, through all)
    with BuildSketch(Plane.XY.offset(6.35)):
        with Locations((-25.6921, 5.334)):
            Circle(SKETCH8_R)
    cut_extrude2 = extrude(amount=-CUT_EXTRUDE2_DEPTH, mode=Mode.SUBTRACT)

    # Mirror2: Cut-Extrude2 across plane
    add(cut_extrude2.mirror(Plane(origin=(0, 0, 0), x_dir=(0, 0, 1), z_dir=(1, 0, 0))), mode=Mode.SUBTRACT)


solid = part.part
